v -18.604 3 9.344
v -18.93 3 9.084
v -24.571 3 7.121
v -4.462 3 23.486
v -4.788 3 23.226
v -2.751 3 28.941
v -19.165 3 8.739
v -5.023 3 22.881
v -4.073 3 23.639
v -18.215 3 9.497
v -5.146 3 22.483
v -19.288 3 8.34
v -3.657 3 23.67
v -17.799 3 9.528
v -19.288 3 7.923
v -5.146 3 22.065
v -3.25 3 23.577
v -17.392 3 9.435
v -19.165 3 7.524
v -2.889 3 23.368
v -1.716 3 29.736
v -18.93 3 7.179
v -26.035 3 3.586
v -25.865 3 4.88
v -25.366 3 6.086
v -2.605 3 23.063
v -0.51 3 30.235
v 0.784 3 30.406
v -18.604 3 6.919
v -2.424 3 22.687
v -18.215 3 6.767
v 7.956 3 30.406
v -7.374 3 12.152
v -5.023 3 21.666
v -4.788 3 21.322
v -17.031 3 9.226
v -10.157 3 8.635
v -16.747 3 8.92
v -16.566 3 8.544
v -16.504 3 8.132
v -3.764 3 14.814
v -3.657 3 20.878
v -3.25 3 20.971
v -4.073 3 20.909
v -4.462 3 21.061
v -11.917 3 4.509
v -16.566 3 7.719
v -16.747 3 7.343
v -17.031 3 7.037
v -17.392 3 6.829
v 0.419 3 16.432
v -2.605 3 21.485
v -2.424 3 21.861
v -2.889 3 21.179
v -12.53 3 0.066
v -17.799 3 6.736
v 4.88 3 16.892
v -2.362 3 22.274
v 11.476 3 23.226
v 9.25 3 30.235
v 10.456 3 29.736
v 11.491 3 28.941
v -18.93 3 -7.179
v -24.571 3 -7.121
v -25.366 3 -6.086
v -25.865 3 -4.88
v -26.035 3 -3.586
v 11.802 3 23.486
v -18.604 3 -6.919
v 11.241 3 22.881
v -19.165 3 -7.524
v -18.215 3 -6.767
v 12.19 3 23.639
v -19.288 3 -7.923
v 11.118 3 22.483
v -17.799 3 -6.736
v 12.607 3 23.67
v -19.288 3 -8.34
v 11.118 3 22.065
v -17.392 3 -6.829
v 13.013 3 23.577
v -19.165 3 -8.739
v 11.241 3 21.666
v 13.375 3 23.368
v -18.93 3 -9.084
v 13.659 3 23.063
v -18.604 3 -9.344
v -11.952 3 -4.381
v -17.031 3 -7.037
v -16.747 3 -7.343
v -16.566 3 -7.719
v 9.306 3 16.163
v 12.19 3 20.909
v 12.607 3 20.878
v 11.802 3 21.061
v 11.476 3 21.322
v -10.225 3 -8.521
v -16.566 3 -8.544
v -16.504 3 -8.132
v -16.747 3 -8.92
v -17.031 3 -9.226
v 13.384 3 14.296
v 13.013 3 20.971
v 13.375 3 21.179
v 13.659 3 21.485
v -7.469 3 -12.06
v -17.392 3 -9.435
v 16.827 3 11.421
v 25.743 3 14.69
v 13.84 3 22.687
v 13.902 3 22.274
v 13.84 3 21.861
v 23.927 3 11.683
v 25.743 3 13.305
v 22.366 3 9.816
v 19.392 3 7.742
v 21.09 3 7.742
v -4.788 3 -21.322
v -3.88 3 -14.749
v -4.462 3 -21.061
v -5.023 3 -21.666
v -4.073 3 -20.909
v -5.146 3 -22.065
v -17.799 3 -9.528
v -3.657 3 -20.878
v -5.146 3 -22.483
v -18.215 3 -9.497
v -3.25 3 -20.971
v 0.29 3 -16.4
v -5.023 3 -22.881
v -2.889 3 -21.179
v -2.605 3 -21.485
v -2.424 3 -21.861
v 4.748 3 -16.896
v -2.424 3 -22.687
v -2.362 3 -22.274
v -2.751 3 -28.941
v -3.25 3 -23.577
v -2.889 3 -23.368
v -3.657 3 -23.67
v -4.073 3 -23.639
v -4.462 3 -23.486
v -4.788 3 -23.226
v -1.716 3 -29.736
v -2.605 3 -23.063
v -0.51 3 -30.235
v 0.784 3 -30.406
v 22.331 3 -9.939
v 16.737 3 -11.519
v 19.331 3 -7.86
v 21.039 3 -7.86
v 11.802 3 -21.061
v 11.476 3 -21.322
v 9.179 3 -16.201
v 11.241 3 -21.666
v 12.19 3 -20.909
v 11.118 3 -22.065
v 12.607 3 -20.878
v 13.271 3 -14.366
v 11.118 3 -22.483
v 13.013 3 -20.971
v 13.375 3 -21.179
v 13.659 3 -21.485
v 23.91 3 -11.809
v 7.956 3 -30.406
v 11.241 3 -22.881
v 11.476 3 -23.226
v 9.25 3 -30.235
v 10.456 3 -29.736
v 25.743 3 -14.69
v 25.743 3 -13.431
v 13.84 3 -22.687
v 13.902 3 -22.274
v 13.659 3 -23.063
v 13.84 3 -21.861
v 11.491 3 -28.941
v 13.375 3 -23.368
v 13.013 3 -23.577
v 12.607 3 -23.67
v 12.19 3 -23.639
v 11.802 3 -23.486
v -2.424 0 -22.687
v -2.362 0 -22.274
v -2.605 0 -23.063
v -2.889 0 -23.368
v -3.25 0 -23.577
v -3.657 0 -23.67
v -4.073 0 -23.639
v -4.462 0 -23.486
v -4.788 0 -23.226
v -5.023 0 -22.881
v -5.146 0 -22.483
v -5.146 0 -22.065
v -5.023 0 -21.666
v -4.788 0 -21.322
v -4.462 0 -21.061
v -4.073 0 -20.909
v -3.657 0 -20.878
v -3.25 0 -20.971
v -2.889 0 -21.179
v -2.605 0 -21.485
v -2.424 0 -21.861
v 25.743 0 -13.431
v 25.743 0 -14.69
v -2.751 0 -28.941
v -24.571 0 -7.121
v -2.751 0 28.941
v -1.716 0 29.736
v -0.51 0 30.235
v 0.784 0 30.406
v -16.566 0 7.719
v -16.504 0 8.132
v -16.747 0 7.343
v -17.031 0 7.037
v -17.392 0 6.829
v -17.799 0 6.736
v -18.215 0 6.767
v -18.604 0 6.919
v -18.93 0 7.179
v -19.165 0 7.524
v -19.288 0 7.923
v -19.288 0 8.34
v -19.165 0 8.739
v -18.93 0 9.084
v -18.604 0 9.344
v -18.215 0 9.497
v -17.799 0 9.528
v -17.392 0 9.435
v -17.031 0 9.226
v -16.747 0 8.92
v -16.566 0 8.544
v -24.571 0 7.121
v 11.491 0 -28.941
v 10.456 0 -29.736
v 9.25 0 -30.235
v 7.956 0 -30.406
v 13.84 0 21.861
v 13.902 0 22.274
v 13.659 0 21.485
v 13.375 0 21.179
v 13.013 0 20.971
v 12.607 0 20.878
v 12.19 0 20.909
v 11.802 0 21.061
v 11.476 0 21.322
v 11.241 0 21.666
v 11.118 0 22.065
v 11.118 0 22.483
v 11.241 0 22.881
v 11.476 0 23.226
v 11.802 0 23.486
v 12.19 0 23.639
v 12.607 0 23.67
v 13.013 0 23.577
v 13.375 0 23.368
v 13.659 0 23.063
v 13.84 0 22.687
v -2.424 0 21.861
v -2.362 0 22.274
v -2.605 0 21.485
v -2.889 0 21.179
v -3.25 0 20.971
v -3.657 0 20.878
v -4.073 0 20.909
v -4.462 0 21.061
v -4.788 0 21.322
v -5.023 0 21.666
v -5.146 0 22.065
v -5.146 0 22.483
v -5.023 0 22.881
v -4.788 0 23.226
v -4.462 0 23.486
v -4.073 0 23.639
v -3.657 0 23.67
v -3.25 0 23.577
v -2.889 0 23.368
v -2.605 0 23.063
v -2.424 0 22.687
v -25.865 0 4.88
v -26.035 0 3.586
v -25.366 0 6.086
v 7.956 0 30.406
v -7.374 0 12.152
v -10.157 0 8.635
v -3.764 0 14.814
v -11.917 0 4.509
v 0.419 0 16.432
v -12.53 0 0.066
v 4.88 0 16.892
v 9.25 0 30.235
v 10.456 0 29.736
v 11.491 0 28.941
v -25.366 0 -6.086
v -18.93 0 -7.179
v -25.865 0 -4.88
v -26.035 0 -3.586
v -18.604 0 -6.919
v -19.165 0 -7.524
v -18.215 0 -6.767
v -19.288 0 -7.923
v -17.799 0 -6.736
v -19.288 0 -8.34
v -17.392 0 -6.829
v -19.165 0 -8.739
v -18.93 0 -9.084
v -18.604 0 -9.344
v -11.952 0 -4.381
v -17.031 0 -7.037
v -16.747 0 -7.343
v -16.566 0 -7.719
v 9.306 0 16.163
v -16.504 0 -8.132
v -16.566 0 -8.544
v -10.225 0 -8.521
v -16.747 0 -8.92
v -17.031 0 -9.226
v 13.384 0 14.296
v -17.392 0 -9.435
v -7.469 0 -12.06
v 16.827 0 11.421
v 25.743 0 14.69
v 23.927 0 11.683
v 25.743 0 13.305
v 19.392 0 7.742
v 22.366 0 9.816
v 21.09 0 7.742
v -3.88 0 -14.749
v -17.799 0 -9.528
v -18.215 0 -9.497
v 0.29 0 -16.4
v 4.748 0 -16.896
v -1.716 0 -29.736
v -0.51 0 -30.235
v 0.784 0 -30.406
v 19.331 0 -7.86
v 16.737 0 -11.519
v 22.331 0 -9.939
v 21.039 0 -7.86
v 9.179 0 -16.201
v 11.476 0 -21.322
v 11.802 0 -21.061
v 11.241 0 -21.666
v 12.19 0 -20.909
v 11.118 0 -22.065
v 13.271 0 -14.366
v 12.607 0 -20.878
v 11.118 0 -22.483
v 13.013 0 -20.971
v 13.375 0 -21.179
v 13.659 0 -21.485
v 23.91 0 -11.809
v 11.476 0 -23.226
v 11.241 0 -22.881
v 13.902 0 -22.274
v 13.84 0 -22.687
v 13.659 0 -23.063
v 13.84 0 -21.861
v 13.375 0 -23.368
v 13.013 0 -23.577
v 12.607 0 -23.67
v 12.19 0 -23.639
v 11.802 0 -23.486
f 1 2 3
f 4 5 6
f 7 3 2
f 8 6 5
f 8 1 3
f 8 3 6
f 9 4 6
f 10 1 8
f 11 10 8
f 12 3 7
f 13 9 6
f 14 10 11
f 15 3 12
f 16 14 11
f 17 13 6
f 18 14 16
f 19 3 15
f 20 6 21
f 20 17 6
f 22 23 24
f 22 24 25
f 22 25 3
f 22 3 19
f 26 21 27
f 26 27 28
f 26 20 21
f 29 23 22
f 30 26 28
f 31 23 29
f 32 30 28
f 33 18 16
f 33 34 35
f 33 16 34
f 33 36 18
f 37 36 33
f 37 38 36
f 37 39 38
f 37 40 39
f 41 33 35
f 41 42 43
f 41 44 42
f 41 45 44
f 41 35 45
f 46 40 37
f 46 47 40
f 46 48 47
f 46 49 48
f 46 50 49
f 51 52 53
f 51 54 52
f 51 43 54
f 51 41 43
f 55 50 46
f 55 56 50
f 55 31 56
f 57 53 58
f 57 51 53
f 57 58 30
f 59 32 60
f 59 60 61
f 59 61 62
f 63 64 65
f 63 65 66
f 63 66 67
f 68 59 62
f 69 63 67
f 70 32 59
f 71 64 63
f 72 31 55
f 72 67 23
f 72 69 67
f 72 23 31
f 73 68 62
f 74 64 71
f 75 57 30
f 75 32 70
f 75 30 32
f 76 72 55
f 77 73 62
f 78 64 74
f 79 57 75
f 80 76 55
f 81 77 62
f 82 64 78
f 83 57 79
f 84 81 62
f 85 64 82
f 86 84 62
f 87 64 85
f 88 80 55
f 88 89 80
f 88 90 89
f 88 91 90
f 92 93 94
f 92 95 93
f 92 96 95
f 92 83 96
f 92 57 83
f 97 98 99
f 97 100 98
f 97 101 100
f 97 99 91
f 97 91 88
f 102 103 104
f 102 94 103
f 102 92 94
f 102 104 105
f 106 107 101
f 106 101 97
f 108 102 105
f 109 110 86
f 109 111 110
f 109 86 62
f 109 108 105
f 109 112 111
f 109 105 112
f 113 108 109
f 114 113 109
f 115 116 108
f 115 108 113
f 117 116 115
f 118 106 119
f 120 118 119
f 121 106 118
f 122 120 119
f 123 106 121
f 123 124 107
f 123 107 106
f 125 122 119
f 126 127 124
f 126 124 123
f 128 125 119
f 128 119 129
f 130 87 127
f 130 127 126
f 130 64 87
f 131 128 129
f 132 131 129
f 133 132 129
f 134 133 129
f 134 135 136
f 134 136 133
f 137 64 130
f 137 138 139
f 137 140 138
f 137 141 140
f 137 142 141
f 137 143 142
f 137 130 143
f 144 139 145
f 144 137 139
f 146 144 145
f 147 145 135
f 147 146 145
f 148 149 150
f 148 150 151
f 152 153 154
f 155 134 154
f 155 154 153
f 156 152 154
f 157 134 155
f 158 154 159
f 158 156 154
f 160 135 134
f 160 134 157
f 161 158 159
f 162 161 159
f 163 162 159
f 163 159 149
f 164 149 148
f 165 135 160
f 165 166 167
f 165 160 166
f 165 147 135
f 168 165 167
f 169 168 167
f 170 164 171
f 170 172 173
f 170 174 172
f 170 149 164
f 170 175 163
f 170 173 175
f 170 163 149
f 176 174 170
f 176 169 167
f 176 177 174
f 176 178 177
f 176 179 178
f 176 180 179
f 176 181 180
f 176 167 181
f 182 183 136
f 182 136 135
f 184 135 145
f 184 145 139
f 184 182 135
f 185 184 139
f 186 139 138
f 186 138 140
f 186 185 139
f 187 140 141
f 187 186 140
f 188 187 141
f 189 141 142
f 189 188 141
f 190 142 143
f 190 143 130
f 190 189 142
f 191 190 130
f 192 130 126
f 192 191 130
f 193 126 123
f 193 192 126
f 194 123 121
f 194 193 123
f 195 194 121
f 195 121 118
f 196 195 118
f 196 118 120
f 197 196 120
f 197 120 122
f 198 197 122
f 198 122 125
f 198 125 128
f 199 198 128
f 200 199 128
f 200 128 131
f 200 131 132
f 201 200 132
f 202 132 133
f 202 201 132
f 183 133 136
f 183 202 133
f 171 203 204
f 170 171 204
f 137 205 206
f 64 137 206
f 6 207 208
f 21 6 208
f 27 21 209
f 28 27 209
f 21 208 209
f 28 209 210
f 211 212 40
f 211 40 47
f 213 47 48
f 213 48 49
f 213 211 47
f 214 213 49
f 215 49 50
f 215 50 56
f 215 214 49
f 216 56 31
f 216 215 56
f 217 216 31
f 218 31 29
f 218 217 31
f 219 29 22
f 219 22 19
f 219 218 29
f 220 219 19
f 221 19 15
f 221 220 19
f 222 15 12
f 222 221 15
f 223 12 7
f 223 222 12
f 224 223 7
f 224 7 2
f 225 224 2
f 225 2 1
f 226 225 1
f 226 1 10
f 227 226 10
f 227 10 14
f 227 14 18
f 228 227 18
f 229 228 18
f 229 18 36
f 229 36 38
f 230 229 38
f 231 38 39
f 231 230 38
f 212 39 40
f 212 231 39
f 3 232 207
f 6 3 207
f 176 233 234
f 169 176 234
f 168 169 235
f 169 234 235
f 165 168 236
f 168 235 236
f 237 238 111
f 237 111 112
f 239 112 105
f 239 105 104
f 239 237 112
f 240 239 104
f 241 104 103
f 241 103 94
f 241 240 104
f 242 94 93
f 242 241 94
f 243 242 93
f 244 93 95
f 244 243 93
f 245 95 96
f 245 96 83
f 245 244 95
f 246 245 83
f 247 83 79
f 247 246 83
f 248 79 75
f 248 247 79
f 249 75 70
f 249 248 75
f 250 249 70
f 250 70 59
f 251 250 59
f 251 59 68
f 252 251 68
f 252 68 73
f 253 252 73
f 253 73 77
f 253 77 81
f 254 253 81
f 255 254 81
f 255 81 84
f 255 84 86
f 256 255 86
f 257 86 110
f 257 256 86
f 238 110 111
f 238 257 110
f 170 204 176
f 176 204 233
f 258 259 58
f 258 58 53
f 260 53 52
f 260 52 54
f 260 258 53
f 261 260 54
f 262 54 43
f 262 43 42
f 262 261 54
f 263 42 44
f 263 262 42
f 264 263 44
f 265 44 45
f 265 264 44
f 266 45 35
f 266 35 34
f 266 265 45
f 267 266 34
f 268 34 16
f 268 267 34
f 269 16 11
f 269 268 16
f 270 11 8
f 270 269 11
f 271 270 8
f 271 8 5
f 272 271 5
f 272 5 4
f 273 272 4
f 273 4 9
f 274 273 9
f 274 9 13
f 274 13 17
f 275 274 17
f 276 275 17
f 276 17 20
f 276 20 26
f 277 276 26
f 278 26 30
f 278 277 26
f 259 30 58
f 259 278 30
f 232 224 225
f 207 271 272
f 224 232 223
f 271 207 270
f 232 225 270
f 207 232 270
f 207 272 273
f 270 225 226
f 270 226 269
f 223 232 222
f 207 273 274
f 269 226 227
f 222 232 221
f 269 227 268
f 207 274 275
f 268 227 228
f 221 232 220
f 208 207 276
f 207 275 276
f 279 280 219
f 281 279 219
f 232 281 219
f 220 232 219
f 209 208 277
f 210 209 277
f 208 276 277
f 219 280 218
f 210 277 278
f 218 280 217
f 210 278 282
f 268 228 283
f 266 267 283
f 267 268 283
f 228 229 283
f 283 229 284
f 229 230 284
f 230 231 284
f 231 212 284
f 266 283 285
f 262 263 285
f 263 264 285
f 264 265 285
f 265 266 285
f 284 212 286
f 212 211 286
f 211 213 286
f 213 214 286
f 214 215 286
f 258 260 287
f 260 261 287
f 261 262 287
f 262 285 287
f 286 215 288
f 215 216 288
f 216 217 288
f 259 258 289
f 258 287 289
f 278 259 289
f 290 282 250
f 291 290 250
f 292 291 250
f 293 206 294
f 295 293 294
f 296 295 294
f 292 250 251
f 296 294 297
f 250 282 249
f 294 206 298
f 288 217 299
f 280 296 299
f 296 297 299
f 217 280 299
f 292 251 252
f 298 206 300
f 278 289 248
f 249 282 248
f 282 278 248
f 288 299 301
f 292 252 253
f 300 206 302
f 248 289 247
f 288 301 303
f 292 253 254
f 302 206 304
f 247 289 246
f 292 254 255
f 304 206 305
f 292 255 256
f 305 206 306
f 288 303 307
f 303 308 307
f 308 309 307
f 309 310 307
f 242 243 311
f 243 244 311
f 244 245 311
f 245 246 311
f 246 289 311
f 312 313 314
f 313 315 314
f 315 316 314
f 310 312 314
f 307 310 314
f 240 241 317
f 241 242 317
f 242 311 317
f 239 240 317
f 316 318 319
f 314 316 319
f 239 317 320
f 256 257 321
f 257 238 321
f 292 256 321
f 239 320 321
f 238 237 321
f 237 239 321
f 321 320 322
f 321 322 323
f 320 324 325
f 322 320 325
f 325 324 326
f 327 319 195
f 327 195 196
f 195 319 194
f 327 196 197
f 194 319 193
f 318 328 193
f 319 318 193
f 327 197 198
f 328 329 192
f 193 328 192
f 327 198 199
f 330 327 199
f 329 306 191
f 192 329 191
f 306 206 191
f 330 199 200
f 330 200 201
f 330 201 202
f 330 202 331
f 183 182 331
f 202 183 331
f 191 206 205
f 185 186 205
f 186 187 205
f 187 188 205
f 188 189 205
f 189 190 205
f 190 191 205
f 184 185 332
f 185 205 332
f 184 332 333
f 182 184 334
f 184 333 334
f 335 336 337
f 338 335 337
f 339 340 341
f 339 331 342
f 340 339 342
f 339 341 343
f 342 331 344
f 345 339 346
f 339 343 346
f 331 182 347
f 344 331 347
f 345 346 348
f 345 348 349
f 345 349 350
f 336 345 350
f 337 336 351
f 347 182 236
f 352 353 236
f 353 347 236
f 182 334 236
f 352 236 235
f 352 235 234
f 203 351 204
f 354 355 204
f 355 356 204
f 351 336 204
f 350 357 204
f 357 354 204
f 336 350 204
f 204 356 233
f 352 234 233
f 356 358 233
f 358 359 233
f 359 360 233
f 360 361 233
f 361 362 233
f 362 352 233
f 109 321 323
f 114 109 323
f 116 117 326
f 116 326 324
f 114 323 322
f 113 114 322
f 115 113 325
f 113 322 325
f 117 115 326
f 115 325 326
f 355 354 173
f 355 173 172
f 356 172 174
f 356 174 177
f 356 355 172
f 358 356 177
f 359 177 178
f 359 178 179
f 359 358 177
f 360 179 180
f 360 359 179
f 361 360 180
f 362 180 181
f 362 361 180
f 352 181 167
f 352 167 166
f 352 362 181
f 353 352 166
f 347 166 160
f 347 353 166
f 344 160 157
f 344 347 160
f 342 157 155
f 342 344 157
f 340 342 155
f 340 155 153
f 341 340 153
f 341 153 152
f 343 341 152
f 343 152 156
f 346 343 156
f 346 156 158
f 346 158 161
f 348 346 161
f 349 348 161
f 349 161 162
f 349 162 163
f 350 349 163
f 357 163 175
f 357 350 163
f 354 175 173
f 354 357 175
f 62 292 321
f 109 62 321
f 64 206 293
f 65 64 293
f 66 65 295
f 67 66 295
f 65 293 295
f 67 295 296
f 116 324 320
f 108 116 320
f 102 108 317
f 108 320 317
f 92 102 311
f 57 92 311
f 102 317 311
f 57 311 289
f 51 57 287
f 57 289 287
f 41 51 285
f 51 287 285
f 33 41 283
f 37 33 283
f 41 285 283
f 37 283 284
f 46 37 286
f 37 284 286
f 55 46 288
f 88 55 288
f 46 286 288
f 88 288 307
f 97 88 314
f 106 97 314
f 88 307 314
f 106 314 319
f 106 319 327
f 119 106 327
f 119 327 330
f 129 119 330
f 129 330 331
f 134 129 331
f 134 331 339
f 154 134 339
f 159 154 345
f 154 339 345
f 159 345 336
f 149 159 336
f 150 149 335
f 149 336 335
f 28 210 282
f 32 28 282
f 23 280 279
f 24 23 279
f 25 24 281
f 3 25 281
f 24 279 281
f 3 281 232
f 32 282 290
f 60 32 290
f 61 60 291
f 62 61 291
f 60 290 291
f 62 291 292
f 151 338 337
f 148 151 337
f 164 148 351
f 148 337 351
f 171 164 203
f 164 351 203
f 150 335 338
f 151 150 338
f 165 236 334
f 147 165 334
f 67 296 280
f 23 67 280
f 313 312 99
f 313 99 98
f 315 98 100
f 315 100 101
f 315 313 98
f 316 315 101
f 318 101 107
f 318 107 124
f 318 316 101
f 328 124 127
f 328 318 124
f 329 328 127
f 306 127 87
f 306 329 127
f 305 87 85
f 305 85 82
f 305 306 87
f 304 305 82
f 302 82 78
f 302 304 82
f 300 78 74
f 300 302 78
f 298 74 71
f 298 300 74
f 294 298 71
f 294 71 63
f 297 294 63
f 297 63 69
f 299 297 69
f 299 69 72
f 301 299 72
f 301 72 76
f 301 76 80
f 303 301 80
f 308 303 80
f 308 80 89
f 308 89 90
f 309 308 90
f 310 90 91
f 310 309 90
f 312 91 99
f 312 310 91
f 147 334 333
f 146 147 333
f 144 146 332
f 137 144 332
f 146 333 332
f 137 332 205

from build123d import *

# Parameters (mm, degrees)
SKETCH1_R           = 1.4
BOSS_EXTRUDE1_DEPTH = 3


with BuildPart() as part:
    # Sketch1 → Boss-Extrude1 (new body)
    with BuildSketch(Plane(origin=(0, 0, 0), x_dir=(1, 0, 0), z_dir=(0, 1, 0))):
        with BuildLine():
            Line((25.742531042, 14.690082128), (11.491487674, 28.941125497))
            ThreePointArc((11.491487674, 28.941125497), (9.869370929, 30.024989254), (7.955953768, 30.405591591))
            Line((7.955953768, 30.405591591), (0.784380892, 30.405591591))
            ThreePointArc((0.784380892, 30.405591591), (-1.129036269, 30.024989254), (-2.751153014, 28.941125497))
            Line((-2.751153014, 28.941125497), (-24.570958167, 7.121320344))
            ThreePointArc((-24.570958167, 7.121320344), (-25.654821924, 5.499203599), (-26.035424261, 3.585786438))
            Line((-26.035424261, 3.585786438), (-26.035424261, -3.585786438))
            ThreePointArc((-26.035424261, -3.585786438), (-25.654821924, -5.499203599), (-24.570958167, -7.121320344))
            Line((-24.570958167, -7.121320344), (-2.751153014, -28.941125497))
            ThreePointArc((-2.751153014, -28.941125497), (-1.129036269, -30.024989254), (0.784380892, -30.405591591))
            Line((0.784380892, -30.405591591), (7.955953768, -30.405591591))
            ThreePointArc((7.955953768, -30.405591591), (9.869370929, -30.024989254), (11.491487674, -28.941125497))
            Line((11.491487674, -28.941125497), (25.742531042, -14.690082128))
            Line((25.742531042, -14.690082128), (25.742531042, -13.305049063))
            ThreePointArc((25.742531042, -13.305049063), (23.11272458, -10.777668219), (21.090366856, -7.742276119))
            Line((21.090366856, -7.742276119), (19.392389552, -7.742276119))
            ThreePointArc((19.392389552, -7.742276119), (-12.529702293, -0.066383131), (19.331103203, 7.860050751))
            Line((19.331103203, 7.860050751), (21.039064127, 7.860050751))
            ThreePointArc((21.039064127, 7.860050751), (23.086785029, 10.90224193), (25.742531042, 13.431095658))
            Line((25.742531042, 13.431095658), (25.742531042, 14.690082128))
        make_face()
        with Locations((12.501895314, -22.273863607)):
            Circle(SKETCH1_R, mode=Mode.SUBTRACT)
        with Locations((-3.761560654, -22.273863607)):
            Circle(SKETCH1_R, mode=Mode.SUBTRACT)
        with Locations((-17.903696277, -8.131727984)):
            Circle(SKETCH1_R, mode=Mode.SUBTRACT)
        with Locations((-17.903696277, 8.131727984)):
            Circle(SKETCH1_R, mode=Mode.SUBTRACT)
        with Locations((-3.761560654, 22.273863607)):
            Circle(SKETCH1_R, mode=Mode.SUBTRACT)
        with Locations((12.501895314, 22.273863607)):
            Circle(SKETCH1_R, mode=Mode.SUBTRACT)
    extrude(amount=BOSS_EXTRUDE1_DEPTH)


solid = part.part
